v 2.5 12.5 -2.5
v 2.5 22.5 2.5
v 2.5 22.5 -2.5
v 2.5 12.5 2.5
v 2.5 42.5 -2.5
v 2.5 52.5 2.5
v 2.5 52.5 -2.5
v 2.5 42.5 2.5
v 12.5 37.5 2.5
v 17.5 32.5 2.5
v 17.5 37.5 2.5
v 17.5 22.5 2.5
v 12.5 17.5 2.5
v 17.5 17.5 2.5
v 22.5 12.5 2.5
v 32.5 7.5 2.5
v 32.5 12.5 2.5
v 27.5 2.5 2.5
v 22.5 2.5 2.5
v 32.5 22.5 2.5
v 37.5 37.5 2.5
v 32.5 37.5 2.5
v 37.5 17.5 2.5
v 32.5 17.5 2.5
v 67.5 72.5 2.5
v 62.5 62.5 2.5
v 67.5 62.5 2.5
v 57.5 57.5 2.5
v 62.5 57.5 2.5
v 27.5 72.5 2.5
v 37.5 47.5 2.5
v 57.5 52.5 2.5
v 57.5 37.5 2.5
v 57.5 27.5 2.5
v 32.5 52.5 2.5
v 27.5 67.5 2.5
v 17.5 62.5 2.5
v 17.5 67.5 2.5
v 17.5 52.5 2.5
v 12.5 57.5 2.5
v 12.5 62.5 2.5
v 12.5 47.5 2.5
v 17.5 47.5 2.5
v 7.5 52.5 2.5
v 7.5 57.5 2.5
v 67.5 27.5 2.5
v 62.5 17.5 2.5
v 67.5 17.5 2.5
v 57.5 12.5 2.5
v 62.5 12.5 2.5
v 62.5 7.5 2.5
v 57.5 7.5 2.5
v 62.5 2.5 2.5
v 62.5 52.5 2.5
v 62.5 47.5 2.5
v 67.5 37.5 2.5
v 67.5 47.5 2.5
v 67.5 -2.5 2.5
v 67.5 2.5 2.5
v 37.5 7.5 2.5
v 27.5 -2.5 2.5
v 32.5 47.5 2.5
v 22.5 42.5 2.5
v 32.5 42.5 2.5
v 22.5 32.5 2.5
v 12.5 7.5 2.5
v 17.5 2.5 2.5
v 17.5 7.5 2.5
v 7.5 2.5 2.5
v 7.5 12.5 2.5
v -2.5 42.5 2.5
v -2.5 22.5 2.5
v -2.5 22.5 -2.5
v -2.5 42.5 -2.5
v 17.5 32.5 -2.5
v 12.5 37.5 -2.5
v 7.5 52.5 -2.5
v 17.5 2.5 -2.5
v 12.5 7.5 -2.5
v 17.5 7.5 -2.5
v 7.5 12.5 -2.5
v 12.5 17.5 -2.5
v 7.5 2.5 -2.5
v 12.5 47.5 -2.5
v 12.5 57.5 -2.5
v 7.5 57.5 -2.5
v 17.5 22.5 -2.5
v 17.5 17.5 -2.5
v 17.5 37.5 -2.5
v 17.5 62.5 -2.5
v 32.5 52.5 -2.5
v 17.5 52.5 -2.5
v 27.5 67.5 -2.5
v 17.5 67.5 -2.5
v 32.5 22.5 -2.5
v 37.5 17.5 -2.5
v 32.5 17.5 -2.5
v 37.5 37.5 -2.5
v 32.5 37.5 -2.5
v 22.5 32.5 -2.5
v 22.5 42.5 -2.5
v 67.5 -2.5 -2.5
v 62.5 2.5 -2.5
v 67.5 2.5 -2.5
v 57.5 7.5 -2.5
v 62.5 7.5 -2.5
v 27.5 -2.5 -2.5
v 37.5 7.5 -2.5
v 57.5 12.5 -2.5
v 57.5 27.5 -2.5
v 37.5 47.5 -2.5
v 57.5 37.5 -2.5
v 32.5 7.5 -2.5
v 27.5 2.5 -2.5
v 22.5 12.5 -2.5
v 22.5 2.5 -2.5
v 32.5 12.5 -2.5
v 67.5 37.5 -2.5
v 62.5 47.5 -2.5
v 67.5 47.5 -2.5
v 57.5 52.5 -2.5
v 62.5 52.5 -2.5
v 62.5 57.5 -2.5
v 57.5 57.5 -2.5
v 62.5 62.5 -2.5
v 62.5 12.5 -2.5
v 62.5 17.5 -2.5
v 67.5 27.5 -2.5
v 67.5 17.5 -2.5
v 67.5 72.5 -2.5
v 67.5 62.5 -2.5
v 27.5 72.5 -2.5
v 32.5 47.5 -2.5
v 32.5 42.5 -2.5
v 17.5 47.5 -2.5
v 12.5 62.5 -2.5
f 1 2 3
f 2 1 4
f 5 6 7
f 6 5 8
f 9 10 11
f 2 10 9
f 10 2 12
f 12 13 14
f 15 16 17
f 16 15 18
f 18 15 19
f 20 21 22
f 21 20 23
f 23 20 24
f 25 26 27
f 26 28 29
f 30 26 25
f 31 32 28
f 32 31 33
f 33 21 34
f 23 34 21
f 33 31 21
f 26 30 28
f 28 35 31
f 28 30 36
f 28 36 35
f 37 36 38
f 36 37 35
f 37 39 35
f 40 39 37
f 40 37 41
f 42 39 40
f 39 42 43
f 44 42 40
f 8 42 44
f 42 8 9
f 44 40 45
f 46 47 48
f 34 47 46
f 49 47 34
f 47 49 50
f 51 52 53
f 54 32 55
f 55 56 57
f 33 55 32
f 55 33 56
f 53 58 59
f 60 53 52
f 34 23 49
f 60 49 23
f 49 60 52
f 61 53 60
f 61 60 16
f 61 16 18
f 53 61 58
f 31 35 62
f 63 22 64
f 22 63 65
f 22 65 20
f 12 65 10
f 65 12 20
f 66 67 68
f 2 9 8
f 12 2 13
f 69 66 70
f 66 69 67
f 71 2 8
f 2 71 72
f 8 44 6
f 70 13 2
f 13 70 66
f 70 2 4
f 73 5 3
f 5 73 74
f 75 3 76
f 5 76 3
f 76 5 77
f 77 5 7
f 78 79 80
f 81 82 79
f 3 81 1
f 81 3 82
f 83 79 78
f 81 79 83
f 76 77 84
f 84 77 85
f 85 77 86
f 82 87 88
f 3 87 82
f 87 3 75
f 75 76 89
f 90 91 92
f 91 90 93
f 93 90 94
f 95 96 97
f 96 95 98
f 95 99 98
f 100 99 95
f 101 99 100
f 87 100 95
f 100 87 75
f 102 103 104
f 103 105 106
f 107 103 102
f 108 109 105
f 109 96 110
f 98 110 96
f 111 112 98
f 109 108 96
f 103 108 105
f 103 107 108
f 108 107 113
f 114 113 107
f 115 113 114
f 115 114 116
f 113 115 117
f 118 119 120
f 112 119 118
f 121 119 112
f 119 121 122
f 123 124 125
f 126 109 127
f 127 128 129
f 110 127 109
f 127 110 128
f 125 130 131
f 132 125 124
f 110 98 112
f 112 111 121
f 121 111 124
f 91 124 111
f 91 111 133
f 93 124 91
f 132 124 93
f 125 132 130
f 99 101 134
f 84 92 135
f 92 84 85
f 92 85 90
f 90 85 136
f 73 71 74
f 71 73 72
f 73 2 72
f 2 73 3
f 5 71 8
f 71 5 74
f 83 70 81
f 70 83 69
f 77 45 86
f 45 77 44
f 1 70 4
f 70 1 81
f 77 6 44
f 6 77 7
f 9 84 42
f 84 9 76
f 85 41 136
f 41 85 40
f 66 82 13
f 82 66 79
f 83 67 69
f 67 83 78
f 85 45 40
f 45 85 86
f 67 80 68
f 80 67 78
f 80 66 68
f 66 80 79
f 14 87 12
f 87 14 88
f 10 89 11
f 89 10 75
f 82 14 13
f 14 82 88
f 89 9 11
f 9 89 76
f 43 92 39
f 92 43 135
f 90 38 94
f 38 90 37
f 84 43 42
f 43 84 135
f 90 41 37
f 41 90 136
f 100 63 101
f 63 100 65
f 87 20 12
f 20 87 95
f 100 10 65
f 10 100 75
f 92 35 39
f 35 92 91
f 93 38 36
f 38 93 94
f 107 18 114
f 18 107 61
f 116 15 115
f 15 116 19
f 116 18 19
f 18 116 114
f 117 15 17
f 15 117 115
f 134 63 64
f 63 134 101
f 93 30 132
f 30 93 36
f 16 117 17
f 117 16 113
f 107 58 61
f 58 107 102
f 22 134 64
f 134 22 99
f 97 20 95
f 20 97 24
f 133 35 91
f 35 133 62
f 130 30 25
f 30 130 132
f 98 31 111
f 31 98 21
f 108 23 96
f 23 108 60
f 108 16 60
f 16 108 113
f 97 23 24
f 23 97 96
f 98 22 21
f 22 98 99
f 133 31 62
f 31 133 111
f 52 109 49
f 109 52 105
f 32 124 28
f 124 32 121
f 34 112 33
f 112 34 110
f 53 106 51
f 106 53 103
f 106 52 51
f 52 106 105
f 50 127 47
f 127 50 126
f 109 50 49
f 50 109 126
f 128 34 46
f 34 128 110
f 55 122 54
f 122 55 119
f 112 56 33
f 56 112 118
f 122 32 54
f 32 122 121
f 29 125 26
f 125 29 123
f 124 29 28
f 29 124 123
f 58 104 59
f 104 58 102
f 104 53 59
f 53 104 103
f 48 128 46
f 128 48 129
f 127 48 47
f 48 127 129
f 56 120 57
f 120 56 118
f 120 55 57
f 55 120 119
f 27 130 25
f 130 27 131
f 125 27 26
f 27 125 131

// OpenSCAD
/***********************************************************************
Name ......... : pacmanGhost.scad
Description....: Pacman Ghosts
Author ....... : Garrett Melenka
Version ...... : V1.0 2016/10/15
Licence ...... : GPL
***********************************************************************/

//Dimensions for Ghosts
//Pixel Size- size of each square
pixelSize = 5;
//Pixel Height- height of each square
pixelHeight = 5;


ghostSelect = 1; //[1:Ghost 01, 2:Ghost 02]

//Matricies to setup the different Pacman Ghosts
ghost01 =   [[0,0,0,0,0,1,1,1,1,0,0,0,0,0,0],
             [0,0,0,1,1,1,1,1,1,1,1,0,0,0,0],
             [0,1,1,1,1,1,1,1,1,1,1,1,0,0,0],
             [0,1,0,0,1,1,1,1,0,0,1,1,1,0,0],
             [0,0,0,0,0,1,1,0,0,0,0,1,1,1,0],
             [0,2,2,0,0,1,1,2,2,0,0,1,1,1,0],
             [1,2,2,0,0,1,1,2,2,0,0,1,1,1,1],
             [1,1,0,0,1,1,1,1,0,0,1,1,1,1,1],
             [1,1,1,1,1,1,1,1,1,1,1,1,1,1,1],
             [1,1,1,1,1,1,1,1,1,1,1,1,1,1,1],
             [1,1,1,1,1,1,1,1,1,1,1,1,1,1,1],
             [1,1,1,1,1,1,1,1,1,1,1,1,1,1,1],
             [1,1,0,1,1,1,0,0,1,1,1,0,1,1,1],
             [1,0,0,0,1,1,0,0,1,1,0,0,0,1,1]];

ghost02 = [[0,0,0,0,0,1,1,1,1,0,0,0,0,0,0],
           [0,0,0,1,1,1,1,1,1,1,1,0,0,0,0],
           [0,0,1,1,1,1,1,1,1,1,1,1,0,0,0],
           [0,1,1,1,1,1,1,1,1,1,1,1,1,0,0],
           [0,1,1,1,1,1,1,1,1,1,1,1,1,0,0],
           [0,1,1,1,0,0,1,1,0,0,1,1,1,0,0],
           [1,1,1,1,0,0,1,1,0,0,1,1,1,1,0],
           [1,1,1,1,1,1,1,1,1,1,1,1,1,1,0],
           [1,1,0,0,1,1,0,0,1,1,0,0,1,1,0],
           [1,0,1,1,0,0,1,1,0,0,1,1,0,1,0],
           [1,1,1,1,1,1,1,1,1,1,1,1,1,1,0],
           [1,1,1,1,0,1,1,1,1,0,1,1,1,1,0],
           [0,1,1,0,0,0,1,1,0,0,0,1,1,0,0]];
             


module pixel()
{
    
    cube(size = [pixelSize, pixelSize, pixelHeight], center = true);
}


module pacmanGhost()
{
    
    for(i = [0:14])
    {
        for(j = [0:14])
        {
            //ghost 01
            if (ghostSelect ==1)
            {
            if (ghost01[i][j] == 1)
            {
                    
            
            translate([pixelSize*i, pixelSize*j,0])
            {
                pixel();
            }
            }
            
            if (ghost01[i][j] == 2)
            {
                    
            
            translate([pixelSize*i, pixelSize*j,0])
            {
                color([1,1,1])
                pixel();
            }
            }
            
                        
            }
            //ghost 02
            if (ghostSelect == 2)
            {
            if (ghost02[i][j] == 1)
            {
                    
            
            translate([pixelSize*i, pixelSize*j,0])
            {
                pixel(); 
            }
            }
            }
            
        }
    }
    
    
    
}
//Show the Ghost
pacmanGhost();
